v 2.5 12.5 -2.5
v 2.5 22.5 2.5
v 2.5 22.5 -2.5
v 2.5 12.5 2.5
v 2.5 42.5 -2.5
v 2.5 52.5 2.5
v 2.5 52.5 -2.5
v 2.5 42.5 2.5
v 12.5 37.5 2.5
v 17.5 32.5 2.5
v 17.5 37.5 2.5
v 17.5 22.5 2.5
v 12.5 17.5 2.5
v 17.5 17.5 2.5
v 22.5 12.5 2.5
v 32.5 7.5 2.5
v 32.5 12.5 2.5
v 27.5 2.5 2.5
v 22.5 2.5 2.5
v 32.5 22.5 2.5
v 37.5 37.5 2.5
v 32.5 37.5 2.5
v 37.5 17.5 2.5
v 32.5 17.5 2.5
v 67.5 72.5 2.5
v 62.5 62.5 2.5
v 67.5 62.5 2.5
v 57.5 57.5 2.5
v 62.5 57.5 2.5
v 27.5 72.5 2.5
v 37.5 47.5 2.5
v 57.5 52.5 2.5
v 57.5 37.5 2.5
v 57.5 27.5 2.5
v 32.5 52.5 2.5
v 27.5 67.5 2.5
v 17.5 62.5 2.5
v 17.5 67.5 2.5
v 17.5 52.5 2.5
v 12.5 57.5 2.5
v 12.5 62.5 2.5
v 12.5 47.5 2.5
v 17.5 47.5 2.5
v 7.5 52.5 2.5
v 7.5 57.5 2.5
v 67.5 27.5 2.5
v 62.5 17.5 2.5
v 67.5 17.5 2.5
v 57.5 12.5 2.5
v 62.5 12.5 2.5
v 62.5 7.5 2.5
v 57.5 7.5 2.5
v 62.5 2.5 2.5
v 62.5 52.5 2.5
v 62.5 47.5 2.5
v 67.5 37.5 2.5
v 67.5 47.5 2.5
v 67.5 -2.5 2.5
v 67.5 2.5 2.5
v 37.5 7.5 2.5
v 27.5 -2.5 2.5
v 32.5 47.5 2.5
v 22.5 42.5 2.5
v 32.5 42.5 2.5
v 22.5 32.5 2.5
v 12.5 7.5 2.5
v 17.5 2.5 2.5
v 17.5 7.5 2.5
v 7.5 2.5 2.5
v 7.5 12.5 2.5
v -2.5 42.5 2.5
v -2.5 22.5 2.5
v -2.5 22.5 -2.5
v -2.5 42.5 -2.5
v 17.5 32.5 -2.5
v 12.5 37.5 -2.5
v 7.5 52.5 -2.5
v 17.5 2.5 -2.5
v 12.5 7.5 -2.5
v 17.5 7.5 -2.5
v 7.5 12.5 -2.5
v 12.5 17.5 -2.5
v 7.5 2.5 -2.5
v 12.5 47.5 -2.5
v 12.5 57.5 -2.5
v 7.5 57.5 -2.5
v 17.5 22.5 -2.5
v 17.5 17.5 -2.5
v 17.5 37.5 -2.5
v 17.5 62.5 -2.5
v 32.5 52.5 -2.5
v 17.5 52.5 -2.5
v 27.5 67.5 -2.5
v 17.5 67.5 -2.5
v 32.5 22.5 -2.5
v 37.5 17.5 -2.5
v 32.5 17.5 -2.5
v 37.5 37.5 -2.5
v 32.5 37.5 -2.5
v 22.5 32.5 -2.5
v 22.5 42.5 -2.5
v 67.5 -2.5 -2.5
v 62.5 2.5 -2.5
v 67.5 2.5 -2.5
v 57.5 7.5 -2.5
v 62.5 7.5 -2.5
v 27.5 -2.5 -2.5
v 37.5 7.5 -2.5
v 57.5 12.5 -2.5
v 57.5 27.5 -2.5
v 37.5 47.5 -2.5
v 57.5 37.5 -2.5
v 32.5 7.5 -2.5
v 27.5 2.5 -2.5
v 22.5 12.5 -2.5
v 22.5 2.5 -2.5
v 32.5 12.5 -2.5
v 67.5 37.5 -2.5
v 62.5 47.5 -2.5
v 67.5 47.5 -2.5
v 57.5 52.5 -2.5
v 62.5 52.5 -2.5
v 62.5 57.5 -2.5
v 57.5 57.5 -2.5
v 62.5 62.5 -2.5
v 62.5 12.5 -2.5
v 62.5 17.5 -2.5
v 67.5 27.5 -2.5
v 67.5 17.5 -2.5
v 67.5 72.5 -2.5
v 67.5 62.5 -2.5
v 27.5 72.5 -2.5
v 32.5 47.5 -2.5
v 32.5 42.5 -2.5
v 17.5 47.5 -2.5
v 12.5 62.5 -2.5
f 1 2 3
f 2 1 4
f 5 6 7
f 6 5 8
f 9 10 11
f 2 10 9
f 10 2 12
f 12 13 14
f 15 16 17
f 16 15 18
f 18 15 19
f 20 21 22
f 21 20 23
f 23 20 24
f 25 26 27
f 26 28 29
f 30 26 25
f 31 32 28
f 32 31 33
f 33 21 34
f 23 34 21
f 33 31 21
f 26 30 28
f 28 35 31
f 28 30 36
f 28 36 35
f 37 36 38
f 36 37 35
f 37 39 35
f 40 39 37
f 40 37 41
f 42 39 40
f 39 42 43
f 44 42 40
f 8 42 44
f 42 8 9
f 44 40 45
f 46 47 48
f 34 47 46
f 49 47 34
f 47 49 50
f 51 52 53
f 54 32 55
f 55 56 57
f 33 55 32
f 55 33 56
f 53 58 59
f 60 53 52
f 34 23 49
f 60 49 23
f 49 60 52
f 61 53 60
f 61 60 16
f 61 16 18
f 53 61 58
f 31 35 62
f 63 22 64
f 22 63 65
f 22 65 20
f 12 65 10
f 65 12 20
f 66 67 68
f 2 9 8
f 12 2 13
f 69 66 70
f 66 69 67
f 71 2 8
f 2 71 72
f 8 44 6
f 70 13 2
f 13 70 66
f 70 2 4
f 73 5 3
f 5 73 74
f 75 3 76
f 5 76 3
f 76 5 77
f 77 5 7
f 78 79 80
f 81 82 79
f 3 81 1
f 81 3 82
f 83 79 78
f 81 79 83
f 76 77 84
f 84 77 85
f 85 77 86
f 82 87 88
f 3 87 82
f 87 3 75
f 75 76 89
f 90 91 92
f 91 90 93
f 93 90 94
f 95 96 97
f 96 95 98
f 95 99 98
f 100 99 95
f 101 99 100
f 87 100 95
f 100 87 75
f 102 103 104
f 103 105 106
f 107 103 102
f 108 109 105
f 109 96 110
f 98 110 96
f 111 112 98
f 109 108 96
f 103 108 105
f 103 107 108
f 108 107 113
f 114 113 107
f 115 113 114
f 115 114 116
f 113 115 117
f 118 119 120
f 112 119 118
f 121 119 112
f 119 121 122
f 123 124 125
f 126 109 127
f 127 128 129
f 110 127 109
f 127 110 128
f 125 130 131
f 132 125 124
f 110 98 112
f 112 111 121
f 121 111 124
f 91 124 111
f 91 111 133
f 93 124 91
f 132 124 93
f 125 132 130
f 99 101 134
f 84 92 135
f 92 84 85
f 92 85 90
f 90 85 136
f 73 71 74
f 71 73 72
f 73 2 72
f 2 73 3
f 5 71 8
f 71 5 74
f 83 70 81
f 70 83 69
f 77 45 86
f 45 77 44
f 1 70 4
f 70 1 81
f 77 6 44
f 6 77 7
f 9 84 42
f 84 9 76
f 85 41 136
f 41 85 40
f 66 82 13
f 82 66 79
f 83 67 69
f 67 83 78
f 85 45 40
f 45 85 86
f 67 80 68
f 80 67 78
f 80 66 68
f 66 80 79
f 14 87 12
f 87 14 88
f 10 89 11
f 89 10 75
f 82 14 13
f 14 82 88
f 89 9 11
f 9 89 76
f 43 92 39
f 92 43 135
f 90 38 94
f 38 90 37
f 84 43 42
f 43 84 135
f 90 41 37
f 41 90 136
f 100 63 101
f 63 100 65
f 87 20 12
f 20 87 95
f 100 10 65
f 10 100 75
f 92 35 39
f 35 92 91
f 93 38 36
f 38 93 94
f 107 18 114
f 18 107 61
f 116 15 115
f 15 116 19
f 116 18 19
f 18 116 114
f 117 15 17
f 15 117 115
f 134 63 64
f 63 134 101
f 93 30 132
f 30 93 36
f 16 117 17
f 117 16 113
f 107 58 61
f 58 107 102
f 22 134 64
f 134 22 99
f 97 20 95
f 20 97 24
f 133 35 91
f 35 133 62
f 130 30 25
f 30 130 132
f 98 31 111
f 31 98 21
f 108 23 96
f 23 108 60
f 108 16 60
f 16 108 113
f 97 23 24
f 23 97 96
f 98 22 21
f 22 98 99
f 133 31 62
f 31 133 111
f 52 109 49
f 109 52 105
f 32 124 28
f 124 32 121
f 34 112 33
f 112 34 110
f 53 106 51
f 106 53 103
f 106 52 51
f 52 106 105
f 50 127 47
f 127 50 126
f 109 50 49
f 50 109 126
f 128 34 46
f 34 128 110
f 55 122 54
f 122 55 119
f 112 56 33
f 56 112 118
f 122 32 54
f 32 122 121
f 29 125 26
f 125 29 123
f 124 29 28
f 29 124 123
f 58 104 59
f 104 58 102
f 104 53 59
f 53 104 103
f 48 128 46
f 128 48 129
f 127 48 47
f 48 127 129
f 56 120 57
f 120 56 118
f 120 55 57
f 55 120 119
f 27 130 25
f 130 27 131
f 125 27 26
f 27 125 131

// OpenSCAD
/***********************************************************************
Name ......... : pacmanGhost.scad
Description....: Pacman Ghosts
Author ....... : Garrett Melenka
Version ...... : V1.0 2016/10/15
Licence ...... : GPL
***********************************************************************/

//Dimensions for Ghosts
//Pixel Size- size of each square
pixelSize = 5;
//Pixel Height- height of each square
pixelHeight = 5;


ghostSelect = 1; //[1:Ghost 01, 2:Ghost 02]

//Matricies to setup the different Pacman Ghosts
ghost01 =   [[0,0,0,0,0,1,1,1,1,0,0,0,0,0,0],
             [0,0,0,1,1,1,1,1,1,1,1,0,0,0,0],
             [0,1,1,1,1,1,1,1,1,1,1,1,0,0,0],
             [0,1,0,0,1,1,1,1,0,0,1,1,1,0,0],
             [0,0,0,0,0,1,1,0,0,0,0,1,1,1,0],
             [0,2,2,0,0,1,1,2,2,0,0,1,1,1,0],
             [1,2,2,0,0,1,1,2,2,0,0,1,1,1,1],
             [1,1,0,0,1,1,1,1,0,0,1,1,1,1,1],
             [1,1,1,1,1,1,1,1,1,1,1,1,1,1,1],
             [1,1,1,1,1,1,1,1,1,1,1,1,1,1,1],
             [1,1,1,1,1,1,1,1,1,1,1,1,1,1,1],
             [1,1,1,1,1,1,1,1,1,1,1,1,1,1,1],
             [1,1,0,1,1,1,0,0,1,1,1,0,1,1,1],
             [1,0,0,0,1,1,0,0,1,1,0,0,0,1,1]];

ghost02 = [[0,0,0,0,0,1,1,1,1,0,0,0,0,0,0],
           [0,0,0,1,1,1,1,1,1,1,1,0,0,0,0],
           [0,0,1,1,1,1,1,1,1,1,1,1,0,0,0],
           [0,1,1,1,1,1,1,1,1,1,1,1,1,0,0],
           [0,1,1,1,1,1,1,1,1,1,1,1,1,0,0],
           [0,1,1,1,0,0,1,1,0,0,1,1,1,0,0],
           [1,1,1,1,0,0,1,1,0,0,1,1,1,1,0],
           [1,1,1,1,1,1,1,1,1,1,1,1,1,1,0],
           [1,1,0,0,1,1,0,0,1,1,0,0,1,1,0],
           [1,0,1,1,0,0,1,1,0,0,1,1,0,1,0],
           [1,1,1,1,1,1,1,1,1,1,1,1,1,1,0],
           [1,1,1,1,0,1,1,1,1,0,1,1,1,1,0],
           [0,1,1,0,0,0,1,1,0,0,0,1,1,0,0]];
             


module pixel()
{
    
    cube(size = [pixelSize, pixelSize, pixelHeight], center = true);
}


module pacmanGhost()
{
    
    for(i = [0:14])
    {
        for(j = [0:14])
        {
            //ghost 01
            if (ghostSelect ==1)
            {
            if (ghost01[i][j] == 1)
            {
                    
            
            translate([pixelSize*i, pixelSize*j,0])
            {
                pixel();
            }
            }
            
            if (ghost01[i][j] == 2)
            {
                    
            
            translate([pixelSize*i, pixelSize*j,0])
            {
                color([1,1,1])
                pixel();
            }
            }
            
                        
            }
            //ghost 02
            if (ghostSelect == 2)
            {
            if (ghost02[i][j] == 1)
            {
                    
            
            translate([pixelSize*i, pixelSize*j,0])
            {
                pixel(); 
            }
            }
            }
            
        }
    }
    
    
    
}
//Show the Ghost
pacmanGhost();
